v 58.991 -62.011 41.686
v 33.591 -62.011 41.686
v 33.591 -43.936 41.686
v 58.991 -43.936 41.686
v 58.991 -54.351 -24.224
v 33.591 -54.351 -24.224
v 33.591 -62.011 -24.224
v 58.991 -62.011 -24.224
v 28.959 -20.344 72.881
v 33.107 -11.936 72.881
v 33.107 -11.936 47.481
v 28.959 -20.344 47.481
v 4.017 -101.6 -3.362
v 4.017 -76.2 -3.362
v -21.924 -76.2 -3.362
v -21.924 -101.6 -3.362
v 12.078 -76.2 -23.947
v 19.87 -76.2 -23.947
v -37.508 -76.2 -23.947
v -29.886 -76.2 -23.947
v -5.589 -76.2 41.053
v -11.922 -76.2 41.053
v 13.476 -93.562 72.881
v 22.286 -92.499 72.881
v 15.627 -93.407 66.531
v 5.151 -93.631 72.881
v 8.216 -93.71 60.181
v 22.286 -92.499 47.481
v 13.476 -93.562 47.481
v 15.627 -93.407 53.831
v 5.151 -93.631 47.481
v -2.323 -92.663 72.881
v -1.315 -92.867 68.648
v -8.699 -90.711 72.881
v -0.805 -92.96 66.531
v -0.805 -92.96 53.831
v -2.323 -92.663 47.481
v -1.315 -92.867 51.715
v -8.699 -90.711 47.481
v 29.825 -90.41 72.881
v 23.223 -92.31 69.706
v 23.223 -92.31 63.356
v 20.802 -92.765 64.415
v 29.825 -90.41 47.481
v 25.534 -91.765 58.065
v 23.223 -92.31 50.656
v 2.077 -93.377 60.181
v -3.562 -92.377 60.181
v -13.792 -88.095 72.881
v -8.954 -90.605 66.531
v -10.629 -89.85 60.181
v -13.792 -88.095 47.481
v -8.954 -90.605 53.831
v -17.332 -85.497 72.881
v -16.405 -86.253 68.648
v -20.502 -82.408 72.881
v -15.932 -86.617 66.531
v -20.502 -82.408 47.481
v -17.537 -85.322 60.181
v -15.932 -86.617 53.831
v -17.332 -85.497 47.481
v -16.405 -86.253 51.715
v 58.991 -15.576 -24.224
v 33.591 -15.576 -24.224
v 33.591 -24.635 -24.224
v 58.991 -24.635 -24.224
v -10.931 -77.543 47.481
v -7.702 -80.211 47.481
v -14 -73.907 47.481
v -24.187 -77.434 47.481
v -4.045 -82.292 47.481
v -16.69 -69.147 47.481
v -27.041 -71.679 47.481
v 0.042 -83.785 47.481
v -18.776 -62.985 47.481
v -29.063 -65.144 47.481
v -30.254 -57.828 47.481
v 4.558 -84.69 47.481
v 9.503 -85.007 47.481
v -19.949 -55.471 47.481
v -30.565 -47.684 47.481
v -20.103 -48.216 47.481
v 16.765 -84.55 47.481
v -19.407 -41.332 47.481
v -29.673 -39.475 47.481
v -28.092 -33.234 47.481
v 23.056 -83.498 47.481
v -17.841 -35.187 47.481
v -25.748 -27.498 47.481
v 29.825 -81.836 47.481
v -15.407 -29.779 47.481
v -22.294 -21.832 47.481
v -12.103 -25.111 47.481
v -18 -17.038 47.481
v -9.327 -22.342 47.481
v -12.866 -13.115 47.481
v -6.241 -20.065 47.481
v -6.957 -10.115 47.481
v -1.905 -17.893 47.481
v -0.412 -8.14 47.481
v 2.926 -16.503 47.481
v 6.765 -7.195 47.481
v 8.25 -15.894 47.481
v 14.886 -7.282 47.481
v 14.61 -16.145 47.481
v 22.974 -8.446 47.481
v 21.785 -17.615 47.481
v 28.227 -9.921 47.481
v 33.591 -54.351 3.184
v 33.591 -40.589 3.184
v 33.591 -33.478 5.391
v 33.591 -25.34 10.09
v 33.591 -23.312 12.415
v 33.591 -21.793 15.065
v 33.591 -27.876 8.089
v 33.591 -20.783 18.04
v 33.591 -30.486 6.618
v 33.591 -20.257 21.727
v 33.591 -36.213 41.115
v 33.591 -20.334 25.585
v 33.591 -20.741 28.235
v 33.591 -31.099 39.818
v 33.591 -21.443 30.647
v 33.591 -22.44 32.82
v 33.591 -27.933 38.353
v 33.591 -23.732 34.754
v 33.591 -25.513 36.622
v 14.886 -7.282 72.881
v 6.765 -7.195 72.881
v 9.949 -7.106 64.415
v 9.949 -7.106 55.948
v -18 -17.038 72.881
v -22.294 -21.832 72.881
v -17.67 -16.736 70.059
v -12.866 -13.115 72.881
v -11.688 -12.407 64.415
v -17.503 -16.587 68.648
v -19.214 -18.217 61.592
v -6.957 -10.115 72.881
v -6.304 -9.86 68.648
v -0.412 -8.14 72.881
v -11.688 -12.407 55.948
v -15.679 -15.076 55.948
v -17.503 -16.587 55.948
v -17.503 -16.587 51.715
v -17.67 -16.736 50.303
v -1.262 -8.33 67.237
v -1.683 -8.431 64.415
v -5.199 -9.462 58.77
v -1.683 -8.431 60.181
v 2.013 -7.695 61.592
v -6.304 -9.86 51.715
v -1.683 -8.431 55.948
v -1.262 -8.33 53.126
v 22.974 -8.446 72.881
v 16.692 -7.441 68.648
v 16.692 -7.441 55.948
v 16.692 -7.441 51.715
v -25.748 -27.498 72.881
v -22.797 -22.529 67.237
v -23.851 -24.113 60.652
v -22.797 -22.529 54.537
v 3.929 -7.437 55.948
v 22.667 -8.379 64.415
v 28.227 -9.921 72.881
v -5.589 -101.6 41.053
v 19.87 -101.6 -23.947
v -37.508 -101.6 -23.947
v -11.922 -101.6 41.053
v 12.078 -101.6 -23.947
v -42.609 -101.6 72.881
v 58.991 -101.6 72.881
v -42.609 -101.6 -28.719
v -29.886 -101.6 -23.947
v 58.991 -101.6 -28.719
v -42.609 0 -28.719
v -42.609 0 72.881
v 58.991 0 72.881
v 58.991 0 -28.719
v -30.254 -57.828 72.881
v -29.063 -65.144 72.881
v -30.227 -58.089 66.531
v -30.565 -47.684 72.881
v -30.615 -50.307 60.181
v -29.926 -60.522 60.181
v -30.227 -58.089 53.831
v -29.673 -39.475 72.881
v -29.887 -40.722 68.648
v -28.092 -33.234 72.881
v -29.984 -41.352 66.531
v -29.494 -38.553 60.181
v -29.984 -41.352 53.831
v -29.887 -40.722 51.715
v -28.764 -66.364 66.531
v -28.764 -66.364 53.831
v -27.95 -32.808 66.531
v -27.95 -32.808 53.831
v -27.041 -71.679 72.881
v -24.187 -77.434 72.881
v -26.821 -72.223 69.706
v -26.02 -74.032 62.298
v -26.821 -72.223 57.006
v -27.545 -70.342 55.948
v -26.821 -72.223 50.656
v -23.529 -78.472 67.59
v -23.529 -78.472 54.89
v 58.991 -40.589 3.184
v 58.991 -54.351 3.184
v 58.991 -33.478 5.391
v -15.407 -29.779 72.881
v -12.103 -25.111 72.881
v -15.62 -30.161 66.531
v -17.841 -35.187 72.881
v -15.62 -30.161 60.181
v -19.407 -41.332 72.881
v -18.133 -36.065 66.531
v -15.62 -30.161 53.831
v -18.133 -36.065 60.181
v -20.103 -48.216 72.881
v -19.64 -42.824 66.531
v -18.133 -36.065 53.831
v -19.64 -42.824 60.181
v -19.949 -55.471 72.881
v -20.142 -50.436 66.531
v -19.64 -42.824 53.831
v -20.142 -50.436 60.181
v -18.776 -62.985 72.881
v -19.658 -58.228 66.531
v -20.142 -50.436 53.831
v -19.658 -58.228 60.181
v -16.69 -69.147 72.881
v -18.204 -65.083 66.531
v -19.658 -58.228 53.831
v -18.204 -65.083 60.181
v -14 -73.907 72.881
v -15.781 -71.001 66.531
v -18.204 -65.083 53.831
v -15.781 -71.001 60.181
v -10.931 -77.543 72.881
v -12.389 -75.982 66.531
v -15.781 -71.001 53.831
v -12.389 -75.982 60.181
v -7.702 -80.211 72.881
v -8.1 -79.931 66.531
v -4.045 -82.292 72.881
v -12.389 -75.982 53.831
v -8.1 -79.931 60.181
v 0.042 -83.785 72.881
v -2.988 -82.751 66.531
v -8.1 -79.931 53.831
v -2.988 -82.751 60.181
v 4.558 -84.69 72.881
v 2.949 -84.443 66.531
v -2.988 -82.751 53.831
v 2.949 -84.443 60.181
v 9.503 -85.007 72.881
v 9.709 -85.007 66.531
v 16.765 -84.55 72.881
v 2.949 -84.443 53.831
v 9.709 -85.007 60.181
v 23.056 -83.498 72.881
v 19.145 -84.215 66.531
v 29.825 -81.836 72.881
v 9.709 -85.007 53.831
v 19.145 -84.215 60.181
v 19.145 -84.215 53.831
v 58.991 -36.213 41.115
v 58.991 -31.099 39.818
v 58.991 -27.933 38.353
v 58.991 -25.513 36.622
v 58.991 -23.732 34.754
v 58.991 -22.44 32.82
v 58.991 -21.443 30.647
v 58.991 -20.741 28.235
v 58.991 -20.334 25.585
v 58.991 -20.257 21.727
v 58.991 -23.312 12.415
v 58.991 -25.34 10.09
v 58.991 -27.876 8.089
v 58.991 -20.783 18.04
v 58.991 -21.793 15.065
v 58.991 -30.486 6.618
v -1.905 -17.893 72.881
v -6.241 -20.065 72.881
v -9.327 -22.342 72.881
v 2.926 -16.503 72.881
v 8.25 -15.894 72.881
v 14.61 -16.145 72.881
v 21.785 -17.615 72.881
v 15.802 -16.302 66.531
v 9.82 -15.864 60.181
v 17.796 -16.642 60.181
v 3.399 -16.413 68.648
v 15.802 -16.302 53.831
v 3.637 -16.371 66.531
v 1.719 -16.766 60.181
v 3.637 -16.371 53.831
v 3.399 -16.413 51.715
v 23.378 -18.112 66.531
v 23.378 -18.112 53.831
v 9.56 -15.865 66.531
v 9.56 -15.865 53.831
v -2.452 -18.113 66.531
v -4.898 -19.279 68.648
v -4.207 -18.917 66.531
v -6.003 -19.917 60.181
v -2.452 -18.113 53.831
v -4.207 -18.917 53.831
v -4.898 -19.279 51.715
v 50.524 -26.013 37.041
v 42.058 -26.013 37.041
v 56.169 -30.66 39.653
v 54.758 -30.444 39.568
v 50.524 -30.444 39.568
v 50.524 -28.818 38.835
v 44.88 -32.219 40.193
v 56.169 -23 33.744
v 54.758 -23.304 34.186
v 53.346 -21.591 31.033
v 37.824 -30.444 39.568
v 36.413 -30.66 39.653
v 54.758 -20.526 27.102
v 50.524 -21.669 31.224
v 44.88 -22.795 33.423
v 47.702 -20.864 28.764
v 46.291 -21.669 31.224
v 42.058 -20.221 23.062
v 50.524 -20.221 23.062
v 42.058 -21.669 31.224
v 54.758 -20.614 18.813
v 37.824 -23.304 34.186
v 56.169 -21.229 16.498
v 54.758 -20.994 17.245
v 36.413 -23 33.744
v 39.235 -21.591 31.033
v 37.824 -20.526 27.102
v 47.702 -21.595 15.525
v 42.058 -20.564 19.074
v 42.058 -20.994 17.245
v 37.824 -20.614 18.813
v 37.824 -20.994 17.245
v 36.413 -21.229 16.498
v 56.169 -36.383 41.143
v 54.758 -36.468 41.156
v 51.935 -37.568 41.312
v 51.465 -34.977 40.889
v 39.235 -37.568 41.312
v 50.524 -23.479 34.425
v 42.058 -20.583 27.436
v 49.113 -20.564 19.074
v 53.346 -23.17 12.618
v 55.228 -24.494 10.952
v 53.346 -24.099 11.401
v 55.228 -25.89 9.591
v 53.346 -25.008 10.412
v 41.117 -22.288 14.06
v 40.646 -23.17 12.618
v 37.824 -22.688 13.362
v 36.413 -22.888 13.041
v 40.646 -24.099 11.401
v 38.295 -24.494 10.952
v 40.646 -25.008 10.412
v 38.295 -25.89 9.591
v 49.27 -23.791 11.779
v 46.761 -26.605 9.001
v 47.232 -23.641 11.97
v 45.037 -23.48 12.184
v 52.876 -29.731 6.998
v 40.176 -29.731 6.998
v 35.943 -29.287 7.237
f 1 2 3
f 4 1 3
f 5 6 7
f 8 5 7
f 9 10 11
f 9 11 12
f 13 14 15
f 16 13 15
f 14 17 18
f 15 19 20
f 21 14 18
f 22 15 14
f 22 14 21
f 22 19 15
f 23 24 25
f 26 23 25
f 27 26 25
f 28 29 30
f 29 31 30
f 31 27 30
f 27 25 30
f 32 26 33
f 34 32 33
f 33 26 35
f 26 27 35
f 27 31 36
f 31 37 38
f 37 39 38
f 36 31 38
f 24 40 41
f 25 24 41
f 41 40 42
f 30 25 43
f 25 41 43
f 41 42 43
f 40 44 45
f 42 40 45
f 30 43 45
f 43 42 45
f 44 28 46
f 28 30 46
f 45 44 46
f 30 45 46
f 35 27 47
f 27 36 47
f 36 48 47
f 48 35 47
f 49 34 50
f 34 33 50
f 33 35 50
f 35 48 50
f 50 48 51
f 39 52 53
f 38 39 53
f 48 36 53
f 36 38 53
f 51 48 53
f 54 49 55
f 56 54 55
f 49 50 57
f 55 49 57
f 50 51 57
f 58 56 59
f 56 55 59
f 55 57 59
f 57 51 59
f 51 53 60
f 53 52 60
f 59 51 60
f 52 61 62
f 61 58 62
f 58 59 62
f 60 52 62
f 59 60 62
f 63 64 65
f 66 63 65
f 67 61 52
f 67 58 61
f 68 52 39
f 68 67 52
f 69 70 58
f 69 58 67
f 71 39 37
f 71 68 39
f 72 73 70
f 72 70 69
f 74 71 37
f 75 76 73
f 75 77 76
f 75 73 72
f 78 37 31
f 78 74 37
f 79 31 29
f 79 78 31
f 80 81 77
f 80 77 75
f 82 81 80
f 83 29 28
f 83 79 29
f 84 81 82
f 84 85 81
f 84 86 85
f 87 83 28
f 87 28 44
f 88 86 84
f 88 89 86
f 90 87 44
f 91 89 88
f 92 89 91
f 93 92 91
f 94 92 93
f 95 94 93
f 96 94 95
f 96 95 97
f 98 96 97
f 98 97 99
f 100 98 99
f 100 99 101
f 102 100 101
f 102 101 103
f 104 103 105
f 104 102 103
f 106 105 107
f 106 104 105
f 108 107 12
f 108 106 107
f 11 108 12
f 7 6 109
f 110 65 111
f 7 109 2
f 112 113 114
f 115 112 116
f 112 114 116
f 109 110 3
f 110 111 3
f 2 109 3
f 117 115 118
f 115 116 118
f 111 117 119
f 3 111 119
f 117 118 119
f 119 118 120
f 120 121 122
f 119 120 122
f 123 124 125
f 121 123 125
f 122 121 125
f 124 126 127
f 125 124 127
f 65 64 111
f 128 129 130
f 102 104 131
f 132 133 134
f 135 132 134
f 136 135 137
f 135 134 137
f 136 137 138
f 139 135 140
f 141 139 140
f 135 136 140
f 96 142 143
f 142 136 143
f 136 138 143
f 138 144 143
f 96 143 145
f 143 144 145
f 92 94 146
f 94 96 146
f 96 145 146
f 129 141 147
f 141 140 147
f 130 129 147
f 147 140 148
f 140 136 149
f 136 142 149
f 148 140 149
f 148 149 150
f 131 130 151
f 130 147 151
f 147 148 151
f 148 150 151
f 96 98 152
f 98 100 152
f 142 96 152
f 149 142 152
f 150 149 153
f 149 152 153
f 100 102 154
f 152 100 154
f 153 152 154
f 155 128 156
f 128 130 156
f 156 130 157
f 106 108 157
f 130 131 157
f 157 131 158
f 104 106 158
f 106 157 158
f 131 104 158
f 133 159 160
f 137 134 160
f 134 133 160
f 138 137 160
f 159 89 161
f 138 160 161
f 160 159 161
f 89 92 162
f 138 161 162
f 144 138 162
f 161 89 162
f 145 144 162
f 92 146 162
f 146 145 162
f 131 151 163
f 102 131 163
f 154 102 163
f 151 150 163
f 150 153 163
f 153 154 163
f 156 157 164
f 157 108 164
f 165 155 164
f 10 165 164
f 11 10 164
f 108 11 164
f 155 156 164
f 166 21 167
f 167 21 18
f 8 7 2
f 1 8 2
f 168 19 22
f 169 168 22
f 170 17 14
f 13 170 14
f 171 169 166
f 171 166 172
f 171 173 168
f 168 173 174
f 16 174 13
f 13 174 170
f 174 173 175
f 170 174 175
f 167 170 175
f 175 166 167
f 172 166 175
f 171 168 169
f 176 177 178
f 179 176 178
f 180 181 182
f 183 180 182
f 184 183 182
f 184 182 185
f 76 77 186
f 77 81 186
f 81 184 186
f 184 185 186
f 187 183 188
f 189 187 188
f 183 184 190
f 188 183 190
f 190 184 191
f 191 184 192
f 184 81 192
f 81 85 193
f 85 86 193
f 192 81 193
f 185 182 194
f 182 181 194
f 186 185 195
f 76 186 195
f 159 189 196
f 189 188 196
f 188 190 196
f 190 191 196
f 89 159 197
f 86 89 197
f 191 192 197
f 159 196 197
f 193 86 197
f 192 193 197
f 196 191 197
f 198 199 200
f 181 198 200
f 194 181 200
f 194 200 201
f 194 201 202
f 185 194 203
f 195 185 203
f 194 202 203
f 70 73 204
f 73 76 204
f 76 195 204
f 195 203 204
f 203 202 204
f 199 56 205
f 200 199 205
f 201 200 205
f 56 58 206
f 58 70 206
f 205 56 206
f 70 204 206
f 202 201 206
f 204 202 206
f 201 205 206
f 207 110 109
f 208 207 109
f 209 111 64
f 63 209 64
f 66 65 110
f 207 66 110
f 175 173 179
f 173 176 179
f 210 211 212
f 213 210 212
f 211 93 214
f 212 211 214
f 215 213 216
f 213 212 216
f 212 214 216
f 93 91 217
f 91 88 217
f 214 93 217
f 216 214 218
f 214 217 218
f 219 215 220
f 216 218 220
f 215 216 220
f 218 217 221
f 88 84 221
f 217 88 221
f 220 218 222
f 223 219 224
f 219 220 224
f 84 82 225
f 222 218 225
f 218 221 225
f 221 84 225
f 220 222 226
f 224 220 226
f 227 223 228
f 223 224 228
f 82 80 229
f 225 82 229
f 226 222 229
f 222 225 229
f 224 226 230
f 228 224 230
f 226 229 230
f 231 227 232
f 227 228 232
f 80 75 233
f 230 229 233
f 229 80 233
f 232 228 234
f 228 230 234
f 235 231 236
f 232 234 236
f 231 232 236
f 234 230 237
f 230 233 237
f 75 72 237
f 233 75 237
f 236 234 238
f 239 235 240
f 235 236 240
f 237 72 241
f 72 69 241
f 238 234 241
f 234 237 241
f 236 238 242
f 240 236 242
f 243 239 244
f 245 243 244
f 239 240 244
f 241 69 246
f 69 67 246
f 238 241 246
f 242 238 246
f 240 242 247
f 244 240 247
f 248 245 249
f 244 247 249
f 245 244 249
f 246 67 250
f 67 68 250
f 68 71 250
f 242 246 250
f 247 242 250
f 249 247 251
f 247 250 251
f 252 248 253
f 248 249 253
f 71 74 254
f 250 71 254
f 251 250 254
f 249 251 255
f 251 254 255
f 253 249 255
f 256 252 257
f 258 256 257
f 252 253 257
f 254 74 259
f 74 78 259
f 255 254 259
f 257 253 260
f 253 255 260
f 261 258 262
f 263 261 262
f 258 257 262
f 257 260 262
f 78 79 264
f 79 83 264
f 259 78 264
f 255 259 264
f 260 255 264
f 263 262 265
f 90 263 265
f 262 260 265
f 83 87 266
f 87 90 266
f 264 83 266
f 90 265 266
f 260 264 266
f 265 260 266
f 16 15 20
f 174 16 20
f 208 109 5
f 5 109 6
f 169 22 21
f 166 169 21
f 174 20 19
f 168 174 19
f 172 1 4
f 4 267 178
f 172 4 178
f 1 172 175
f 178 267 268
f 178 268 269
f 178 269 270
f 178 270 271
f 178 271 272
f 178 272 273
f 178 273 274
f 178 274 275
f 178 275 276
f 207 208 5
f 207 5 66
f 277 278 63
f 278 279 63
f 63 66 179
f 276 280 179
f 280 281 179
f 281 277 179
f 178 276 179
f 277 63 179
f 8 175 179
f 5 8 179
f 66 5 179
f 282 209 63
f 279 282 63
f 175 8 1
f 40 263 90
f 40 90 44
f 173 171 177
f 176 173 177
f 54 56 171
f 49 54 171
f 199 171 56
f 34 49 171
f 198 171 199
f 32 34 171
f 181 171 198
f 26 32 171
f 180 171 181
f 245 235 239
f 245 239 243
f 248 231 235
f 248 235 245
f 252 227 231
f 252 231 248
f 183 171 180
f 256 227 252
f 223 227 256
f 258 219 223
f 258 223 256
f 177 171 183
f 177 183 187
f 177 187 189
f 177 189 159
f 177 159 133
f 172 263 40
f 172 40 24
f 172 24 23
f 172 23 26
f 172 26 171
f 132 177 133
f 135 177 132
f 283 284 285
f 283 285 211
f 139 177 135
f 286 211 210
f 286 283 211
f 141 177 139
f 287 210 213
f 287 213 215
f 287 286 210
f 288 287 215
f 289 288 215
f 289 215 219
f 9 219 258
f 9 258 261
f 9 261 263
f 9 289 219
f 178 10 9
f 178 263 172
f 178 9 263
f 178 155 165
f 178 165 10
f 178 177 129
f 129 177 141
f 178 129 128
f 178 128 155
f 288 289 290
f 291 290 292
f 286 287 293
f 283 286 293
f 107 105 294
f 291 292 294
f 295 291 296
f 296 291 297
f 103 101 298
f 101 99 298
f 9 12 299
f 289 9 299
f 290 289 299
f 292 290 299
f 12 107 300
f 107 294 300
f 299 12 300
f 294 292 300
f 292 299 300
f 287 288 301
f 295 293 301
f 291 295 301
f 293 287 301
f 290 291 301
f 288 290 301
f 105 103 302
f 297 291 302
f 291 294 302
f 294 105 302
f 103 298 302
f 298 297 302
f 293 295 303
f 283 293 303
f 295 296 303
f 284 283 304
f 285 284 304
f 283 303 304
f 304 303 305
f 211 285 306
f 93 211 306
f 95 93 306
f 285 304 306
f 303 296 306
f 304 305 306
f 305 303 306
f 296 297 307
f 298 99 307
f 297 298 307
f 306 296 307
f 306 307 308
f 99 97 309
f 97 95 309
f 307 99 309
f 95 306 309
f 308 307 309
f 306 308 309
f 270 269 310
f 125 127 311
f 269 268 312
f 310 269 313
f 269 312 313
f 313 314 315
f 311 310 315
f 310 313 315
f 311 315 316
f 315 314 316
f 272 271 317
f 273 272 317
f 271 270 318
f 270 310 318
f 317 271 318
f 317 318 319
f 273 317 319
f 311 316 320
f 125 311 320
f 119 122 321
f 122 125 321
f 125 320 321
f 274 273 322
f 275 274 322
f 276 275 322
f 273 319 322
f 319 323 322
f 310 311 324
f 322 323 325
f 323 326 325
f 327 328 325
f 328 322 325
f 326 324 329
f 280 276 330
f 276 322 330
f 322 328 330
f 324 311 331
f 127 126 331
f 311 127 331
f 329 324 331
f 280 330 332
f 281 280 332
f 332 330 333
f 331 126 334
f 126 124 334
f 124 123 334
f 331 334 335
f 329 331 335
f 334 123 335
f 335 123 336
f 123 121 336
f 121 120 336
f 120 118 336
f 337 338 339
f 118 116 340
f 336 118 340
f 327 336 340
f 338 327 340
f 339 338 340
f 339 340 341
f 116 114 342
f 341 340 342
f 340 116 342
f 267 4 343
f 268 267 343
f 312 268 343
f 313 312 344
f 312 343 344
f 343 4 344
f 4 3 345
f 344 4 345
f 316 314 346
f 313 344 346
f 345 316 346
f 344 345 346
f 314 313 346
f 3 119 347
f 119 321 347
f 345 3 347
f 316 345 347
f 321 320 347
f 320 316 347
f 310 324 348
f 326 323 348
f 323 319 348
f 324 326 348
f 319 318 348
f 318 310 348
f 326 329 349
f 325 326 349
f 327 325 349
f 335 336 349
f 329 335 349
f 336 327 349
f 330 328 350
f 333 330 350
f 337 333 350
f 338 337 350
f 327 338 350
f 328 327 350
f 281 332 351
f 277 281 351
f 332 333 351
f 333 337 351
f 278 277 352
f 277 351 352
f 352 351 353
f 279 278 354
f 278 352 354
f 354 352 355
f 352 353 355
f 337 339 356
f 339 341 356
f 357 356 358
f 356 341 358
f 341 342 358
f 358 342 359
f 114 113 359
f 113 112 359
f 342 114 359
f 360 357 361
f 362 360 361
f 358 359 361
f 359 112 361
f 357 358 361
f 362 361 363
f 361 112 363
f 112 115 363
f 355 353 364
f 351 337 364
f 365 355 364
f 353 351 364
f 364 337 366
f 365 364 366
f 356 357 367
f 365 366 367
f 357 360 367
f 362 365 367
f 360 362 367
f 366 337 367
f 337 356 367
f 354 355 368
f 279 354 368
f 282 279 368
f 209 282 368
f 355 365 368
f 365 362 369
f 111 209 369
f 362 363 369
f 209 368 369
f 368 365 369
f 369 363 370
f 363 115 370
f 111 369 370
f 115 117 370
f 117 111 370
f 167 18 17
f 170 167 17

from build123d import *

# Parameters (mm, degrees)
F0_W     = 76.2
F0_H     = 76.2
F1_DEPTH = 76.2
F2_W     = 76.2
F2_H     = 76.2
F3_DEPTH = 25.4
F4_W     = 101.6
F4_H     = 76.2
F5_DEPTH = 25.4
F6_W     = 101.6
F6_H     = 101.6
F7_DEPTH = 25.4


with BuildPart() as f1:
    # F0 (on Front) → F1 (new body)
    with BuildSketch(Plane.XZ):
        with Locations((-4.5091081411, 9.3812153666)):
            Rectangle(F0_W, F0_H)
    extrude(amount=F1_DEPTH)

    # F2 (on face) → F3 (join)
    with BuildSketch(Plane.YZ.offset(33.5908918589)):
        with Locations((-38.1, 9.3812153666)):
            Rectangle(F2_W, F2_H)
        with BuildLine():
            Line((-40.5894218998, 3.1841353355), (-54.3512732325, 3.1841353355))
            Line((-54.3512732325, 3.1841353355), (-54.3512732325, -24.2241639644))
            Line((-54.3512732325, -24.2241639644), (-62.0111716158, -24.2241639644))
            Line((-62.0111716158, -24.2241639644), (-62.0111716158, 41.6855831415))
            Line((-62.0111716158, 41.6855831415), (-43.9361194985, 41.6855831415))
            add(Edge.make_bspline(
                [(-43.9361194985, 41.6855831415), (-31.8043407032, 41.6855831415), (-26.0125342985, 37.0405976812)],
                knots=[0, 0, 0, 1, 1, 1], degree=2))
            add(Edge.make_bspline(
                [(-26.0125342985, 37.0405976812), (-20.2207278938, 32.3956122209), (-20.2207278938, 23.0623650382)],
                knots=[0, 0, 0, 1, 1, 1], degree=2))
            add(Edge.make_bspline(
                [(-20.2207278938, 23.0623650382), (-20.2207278938, 9.9929338984), (-33.4776895025, 5.3912247002)],
                knots=[0, 0, 0, 1, 1, 1], degree=2))
            Line((-33.4776895025, 5.3912247002), (-15.5757424335, -24.2241639644))
            Line((-15.5757424335, -24.2241639644), (-24.6349066232, -24.2241639644))
            Line((-24.6349066232, -24.2241639644), (-40.5894218998, 3.1841353355))
        make_face(mode=Mode.SUBTRACT)
    extrude(amount=F3_DEPTH)

    # F4 (on face) → F5 (join)
    with BuildSketch(Plane.XZ.offset(76.2)):
        with Locations((8.1908918589, 9.3812153666)):
            Rectangle(F4_W, F4_H)
        Polygon((19.8698597014, -23.9472966641), (12.0777951104, -23.9472966641), (4.0165501062, -3.3620787536), (-21.9239412868, -3.3620787536), (-29.8860145599, -23.9472966641), (-37.5080704689, -23.9472966641), (-11.92176383, 41.0526894153), (-5.588940426, 41.0526894153), align=None, mode=Mode.SUBTRACT)
    extrude(amount=F5_DEPTH)

    # F6 (on face) → F7 (join)
    with BuildSketch(Plane.XY.offset(47.4812153666)):
        with Locations((8.1908918589, -50.8)):
            Rectangle(F6_W, F6_H)
        with BuildLine():
            add(Edge.make_bspline(
                [(28.9588458513, -20.3443608997), (19.3893672711, -15.8638535876), (9.8198886909, -15.8638535876)],
                knots=[0, 0, 0, 1, 1, 1], degree=2))
            add(Edge.make_bspline(
                [(9.8198886909, -15.8638535876), (-4.0641524861, -15.8638535876), (-12.1032520256, -25.1106618881)],
                knots=[0, 0, 0, 1, 1, 1], degree=2))
            add(Edge.make_bspline(
                [(-12.1032520256, -25.1106618881), (-20.142351565, -34.3574701886), (-20.142351565, -50.4356692674)],
                knots=[0, 0, 0, 1, 1, 1], degree=2))
            add(Edge.make_bspline(
                [(-20.142351565, -50.4356692674), (-20.142351565, -66.956387587), (-12.3890457018, -75.9819362672)],
                knots=[0, 0, 0, 1, 1, 1], degree=2))
            add(Edge.make_bspline(
                [(-12.3890457018, -75.9819362672), (-4.6357398387, -85.0074849473), (9.7092588807, -85.0074849473)],
                knots=[0, 0, 0, 1, 1, 1], degree=2))
            add(Edge.make_bspline(
                [(9.7092588807, -85.0074849473), (18.5227670914, -85.0074849473), (29.825446031, -81.8360970556)],
                knots=[0, 0, 0, 1, 1, 1], degree=2))
            Line((29.825446031, -81.8360970556), (29.825446031, -90.4099073442))
            add(Edge.make_bspline(
                [(29.825446031, -90.4099073442), (21.0672527254, -93.7103633478), (8.2157564434, -93.7103633478)],
                knots=[0, 0, 0, 1, 1, 1], degree=2))
            add(Edge.make_bspline(
                [(8.2157564434, -93.7103633478), (-10.3884899678, -93.7103633478), (-20.501898448, -82.4076844082)],
                knots=[0, 0, 0, 1, 1, 1], degree=2))
            add(Edge.make_bspline(
                [(-20.501898448, -82.4076844082), (-30.6153069283, -71.1050054686), (-30.6153069283, -50.3066011556)],
                knots=[0, 0, 0, 1, 1, 1], degree=2))
            add(Edge.make_bspline(
                [(-30.6153069283, -50.3066011556), (-30.6153069283, -37.2891601583), (-25.7475952805, -27.4984219577)],
                knots=[0, 0, 0, 1, 1, 1], degree=2))
            add(Edge.make_bspline(
                [(-25.7475952805, -27.4984219577), (-20.8798836328, -17.7076837572), (-11.6883902374, -12.4066720196)],
                knots=[0, 0, 0, 1, 1, 1], degree=2))
            add(Edge.make_bspline(
                [(-11.6883902374, -12.4066720196), (-2.496896842, -7.105660282), (9.9489568028, -7.105660282)],
                knots=[0, 0, 0, 1, 1, 1], degree=2))
            add(Edge.make_bspline(
                [(9.9489568028, -7.105660282), (23.1876574204, -7.105660282), (33.1074637329, -11.9364953264)],
                knots=[0, 0, 0, 1, 1, 1], degree=2))
            Line((33.1074637329, -11.9364953264), (28.9588458513, -20.3443608997))
        make_face(mode=Mode.SUBTRACT)
    extrude(amount=F7_DEPTH)


solid = f1.part
